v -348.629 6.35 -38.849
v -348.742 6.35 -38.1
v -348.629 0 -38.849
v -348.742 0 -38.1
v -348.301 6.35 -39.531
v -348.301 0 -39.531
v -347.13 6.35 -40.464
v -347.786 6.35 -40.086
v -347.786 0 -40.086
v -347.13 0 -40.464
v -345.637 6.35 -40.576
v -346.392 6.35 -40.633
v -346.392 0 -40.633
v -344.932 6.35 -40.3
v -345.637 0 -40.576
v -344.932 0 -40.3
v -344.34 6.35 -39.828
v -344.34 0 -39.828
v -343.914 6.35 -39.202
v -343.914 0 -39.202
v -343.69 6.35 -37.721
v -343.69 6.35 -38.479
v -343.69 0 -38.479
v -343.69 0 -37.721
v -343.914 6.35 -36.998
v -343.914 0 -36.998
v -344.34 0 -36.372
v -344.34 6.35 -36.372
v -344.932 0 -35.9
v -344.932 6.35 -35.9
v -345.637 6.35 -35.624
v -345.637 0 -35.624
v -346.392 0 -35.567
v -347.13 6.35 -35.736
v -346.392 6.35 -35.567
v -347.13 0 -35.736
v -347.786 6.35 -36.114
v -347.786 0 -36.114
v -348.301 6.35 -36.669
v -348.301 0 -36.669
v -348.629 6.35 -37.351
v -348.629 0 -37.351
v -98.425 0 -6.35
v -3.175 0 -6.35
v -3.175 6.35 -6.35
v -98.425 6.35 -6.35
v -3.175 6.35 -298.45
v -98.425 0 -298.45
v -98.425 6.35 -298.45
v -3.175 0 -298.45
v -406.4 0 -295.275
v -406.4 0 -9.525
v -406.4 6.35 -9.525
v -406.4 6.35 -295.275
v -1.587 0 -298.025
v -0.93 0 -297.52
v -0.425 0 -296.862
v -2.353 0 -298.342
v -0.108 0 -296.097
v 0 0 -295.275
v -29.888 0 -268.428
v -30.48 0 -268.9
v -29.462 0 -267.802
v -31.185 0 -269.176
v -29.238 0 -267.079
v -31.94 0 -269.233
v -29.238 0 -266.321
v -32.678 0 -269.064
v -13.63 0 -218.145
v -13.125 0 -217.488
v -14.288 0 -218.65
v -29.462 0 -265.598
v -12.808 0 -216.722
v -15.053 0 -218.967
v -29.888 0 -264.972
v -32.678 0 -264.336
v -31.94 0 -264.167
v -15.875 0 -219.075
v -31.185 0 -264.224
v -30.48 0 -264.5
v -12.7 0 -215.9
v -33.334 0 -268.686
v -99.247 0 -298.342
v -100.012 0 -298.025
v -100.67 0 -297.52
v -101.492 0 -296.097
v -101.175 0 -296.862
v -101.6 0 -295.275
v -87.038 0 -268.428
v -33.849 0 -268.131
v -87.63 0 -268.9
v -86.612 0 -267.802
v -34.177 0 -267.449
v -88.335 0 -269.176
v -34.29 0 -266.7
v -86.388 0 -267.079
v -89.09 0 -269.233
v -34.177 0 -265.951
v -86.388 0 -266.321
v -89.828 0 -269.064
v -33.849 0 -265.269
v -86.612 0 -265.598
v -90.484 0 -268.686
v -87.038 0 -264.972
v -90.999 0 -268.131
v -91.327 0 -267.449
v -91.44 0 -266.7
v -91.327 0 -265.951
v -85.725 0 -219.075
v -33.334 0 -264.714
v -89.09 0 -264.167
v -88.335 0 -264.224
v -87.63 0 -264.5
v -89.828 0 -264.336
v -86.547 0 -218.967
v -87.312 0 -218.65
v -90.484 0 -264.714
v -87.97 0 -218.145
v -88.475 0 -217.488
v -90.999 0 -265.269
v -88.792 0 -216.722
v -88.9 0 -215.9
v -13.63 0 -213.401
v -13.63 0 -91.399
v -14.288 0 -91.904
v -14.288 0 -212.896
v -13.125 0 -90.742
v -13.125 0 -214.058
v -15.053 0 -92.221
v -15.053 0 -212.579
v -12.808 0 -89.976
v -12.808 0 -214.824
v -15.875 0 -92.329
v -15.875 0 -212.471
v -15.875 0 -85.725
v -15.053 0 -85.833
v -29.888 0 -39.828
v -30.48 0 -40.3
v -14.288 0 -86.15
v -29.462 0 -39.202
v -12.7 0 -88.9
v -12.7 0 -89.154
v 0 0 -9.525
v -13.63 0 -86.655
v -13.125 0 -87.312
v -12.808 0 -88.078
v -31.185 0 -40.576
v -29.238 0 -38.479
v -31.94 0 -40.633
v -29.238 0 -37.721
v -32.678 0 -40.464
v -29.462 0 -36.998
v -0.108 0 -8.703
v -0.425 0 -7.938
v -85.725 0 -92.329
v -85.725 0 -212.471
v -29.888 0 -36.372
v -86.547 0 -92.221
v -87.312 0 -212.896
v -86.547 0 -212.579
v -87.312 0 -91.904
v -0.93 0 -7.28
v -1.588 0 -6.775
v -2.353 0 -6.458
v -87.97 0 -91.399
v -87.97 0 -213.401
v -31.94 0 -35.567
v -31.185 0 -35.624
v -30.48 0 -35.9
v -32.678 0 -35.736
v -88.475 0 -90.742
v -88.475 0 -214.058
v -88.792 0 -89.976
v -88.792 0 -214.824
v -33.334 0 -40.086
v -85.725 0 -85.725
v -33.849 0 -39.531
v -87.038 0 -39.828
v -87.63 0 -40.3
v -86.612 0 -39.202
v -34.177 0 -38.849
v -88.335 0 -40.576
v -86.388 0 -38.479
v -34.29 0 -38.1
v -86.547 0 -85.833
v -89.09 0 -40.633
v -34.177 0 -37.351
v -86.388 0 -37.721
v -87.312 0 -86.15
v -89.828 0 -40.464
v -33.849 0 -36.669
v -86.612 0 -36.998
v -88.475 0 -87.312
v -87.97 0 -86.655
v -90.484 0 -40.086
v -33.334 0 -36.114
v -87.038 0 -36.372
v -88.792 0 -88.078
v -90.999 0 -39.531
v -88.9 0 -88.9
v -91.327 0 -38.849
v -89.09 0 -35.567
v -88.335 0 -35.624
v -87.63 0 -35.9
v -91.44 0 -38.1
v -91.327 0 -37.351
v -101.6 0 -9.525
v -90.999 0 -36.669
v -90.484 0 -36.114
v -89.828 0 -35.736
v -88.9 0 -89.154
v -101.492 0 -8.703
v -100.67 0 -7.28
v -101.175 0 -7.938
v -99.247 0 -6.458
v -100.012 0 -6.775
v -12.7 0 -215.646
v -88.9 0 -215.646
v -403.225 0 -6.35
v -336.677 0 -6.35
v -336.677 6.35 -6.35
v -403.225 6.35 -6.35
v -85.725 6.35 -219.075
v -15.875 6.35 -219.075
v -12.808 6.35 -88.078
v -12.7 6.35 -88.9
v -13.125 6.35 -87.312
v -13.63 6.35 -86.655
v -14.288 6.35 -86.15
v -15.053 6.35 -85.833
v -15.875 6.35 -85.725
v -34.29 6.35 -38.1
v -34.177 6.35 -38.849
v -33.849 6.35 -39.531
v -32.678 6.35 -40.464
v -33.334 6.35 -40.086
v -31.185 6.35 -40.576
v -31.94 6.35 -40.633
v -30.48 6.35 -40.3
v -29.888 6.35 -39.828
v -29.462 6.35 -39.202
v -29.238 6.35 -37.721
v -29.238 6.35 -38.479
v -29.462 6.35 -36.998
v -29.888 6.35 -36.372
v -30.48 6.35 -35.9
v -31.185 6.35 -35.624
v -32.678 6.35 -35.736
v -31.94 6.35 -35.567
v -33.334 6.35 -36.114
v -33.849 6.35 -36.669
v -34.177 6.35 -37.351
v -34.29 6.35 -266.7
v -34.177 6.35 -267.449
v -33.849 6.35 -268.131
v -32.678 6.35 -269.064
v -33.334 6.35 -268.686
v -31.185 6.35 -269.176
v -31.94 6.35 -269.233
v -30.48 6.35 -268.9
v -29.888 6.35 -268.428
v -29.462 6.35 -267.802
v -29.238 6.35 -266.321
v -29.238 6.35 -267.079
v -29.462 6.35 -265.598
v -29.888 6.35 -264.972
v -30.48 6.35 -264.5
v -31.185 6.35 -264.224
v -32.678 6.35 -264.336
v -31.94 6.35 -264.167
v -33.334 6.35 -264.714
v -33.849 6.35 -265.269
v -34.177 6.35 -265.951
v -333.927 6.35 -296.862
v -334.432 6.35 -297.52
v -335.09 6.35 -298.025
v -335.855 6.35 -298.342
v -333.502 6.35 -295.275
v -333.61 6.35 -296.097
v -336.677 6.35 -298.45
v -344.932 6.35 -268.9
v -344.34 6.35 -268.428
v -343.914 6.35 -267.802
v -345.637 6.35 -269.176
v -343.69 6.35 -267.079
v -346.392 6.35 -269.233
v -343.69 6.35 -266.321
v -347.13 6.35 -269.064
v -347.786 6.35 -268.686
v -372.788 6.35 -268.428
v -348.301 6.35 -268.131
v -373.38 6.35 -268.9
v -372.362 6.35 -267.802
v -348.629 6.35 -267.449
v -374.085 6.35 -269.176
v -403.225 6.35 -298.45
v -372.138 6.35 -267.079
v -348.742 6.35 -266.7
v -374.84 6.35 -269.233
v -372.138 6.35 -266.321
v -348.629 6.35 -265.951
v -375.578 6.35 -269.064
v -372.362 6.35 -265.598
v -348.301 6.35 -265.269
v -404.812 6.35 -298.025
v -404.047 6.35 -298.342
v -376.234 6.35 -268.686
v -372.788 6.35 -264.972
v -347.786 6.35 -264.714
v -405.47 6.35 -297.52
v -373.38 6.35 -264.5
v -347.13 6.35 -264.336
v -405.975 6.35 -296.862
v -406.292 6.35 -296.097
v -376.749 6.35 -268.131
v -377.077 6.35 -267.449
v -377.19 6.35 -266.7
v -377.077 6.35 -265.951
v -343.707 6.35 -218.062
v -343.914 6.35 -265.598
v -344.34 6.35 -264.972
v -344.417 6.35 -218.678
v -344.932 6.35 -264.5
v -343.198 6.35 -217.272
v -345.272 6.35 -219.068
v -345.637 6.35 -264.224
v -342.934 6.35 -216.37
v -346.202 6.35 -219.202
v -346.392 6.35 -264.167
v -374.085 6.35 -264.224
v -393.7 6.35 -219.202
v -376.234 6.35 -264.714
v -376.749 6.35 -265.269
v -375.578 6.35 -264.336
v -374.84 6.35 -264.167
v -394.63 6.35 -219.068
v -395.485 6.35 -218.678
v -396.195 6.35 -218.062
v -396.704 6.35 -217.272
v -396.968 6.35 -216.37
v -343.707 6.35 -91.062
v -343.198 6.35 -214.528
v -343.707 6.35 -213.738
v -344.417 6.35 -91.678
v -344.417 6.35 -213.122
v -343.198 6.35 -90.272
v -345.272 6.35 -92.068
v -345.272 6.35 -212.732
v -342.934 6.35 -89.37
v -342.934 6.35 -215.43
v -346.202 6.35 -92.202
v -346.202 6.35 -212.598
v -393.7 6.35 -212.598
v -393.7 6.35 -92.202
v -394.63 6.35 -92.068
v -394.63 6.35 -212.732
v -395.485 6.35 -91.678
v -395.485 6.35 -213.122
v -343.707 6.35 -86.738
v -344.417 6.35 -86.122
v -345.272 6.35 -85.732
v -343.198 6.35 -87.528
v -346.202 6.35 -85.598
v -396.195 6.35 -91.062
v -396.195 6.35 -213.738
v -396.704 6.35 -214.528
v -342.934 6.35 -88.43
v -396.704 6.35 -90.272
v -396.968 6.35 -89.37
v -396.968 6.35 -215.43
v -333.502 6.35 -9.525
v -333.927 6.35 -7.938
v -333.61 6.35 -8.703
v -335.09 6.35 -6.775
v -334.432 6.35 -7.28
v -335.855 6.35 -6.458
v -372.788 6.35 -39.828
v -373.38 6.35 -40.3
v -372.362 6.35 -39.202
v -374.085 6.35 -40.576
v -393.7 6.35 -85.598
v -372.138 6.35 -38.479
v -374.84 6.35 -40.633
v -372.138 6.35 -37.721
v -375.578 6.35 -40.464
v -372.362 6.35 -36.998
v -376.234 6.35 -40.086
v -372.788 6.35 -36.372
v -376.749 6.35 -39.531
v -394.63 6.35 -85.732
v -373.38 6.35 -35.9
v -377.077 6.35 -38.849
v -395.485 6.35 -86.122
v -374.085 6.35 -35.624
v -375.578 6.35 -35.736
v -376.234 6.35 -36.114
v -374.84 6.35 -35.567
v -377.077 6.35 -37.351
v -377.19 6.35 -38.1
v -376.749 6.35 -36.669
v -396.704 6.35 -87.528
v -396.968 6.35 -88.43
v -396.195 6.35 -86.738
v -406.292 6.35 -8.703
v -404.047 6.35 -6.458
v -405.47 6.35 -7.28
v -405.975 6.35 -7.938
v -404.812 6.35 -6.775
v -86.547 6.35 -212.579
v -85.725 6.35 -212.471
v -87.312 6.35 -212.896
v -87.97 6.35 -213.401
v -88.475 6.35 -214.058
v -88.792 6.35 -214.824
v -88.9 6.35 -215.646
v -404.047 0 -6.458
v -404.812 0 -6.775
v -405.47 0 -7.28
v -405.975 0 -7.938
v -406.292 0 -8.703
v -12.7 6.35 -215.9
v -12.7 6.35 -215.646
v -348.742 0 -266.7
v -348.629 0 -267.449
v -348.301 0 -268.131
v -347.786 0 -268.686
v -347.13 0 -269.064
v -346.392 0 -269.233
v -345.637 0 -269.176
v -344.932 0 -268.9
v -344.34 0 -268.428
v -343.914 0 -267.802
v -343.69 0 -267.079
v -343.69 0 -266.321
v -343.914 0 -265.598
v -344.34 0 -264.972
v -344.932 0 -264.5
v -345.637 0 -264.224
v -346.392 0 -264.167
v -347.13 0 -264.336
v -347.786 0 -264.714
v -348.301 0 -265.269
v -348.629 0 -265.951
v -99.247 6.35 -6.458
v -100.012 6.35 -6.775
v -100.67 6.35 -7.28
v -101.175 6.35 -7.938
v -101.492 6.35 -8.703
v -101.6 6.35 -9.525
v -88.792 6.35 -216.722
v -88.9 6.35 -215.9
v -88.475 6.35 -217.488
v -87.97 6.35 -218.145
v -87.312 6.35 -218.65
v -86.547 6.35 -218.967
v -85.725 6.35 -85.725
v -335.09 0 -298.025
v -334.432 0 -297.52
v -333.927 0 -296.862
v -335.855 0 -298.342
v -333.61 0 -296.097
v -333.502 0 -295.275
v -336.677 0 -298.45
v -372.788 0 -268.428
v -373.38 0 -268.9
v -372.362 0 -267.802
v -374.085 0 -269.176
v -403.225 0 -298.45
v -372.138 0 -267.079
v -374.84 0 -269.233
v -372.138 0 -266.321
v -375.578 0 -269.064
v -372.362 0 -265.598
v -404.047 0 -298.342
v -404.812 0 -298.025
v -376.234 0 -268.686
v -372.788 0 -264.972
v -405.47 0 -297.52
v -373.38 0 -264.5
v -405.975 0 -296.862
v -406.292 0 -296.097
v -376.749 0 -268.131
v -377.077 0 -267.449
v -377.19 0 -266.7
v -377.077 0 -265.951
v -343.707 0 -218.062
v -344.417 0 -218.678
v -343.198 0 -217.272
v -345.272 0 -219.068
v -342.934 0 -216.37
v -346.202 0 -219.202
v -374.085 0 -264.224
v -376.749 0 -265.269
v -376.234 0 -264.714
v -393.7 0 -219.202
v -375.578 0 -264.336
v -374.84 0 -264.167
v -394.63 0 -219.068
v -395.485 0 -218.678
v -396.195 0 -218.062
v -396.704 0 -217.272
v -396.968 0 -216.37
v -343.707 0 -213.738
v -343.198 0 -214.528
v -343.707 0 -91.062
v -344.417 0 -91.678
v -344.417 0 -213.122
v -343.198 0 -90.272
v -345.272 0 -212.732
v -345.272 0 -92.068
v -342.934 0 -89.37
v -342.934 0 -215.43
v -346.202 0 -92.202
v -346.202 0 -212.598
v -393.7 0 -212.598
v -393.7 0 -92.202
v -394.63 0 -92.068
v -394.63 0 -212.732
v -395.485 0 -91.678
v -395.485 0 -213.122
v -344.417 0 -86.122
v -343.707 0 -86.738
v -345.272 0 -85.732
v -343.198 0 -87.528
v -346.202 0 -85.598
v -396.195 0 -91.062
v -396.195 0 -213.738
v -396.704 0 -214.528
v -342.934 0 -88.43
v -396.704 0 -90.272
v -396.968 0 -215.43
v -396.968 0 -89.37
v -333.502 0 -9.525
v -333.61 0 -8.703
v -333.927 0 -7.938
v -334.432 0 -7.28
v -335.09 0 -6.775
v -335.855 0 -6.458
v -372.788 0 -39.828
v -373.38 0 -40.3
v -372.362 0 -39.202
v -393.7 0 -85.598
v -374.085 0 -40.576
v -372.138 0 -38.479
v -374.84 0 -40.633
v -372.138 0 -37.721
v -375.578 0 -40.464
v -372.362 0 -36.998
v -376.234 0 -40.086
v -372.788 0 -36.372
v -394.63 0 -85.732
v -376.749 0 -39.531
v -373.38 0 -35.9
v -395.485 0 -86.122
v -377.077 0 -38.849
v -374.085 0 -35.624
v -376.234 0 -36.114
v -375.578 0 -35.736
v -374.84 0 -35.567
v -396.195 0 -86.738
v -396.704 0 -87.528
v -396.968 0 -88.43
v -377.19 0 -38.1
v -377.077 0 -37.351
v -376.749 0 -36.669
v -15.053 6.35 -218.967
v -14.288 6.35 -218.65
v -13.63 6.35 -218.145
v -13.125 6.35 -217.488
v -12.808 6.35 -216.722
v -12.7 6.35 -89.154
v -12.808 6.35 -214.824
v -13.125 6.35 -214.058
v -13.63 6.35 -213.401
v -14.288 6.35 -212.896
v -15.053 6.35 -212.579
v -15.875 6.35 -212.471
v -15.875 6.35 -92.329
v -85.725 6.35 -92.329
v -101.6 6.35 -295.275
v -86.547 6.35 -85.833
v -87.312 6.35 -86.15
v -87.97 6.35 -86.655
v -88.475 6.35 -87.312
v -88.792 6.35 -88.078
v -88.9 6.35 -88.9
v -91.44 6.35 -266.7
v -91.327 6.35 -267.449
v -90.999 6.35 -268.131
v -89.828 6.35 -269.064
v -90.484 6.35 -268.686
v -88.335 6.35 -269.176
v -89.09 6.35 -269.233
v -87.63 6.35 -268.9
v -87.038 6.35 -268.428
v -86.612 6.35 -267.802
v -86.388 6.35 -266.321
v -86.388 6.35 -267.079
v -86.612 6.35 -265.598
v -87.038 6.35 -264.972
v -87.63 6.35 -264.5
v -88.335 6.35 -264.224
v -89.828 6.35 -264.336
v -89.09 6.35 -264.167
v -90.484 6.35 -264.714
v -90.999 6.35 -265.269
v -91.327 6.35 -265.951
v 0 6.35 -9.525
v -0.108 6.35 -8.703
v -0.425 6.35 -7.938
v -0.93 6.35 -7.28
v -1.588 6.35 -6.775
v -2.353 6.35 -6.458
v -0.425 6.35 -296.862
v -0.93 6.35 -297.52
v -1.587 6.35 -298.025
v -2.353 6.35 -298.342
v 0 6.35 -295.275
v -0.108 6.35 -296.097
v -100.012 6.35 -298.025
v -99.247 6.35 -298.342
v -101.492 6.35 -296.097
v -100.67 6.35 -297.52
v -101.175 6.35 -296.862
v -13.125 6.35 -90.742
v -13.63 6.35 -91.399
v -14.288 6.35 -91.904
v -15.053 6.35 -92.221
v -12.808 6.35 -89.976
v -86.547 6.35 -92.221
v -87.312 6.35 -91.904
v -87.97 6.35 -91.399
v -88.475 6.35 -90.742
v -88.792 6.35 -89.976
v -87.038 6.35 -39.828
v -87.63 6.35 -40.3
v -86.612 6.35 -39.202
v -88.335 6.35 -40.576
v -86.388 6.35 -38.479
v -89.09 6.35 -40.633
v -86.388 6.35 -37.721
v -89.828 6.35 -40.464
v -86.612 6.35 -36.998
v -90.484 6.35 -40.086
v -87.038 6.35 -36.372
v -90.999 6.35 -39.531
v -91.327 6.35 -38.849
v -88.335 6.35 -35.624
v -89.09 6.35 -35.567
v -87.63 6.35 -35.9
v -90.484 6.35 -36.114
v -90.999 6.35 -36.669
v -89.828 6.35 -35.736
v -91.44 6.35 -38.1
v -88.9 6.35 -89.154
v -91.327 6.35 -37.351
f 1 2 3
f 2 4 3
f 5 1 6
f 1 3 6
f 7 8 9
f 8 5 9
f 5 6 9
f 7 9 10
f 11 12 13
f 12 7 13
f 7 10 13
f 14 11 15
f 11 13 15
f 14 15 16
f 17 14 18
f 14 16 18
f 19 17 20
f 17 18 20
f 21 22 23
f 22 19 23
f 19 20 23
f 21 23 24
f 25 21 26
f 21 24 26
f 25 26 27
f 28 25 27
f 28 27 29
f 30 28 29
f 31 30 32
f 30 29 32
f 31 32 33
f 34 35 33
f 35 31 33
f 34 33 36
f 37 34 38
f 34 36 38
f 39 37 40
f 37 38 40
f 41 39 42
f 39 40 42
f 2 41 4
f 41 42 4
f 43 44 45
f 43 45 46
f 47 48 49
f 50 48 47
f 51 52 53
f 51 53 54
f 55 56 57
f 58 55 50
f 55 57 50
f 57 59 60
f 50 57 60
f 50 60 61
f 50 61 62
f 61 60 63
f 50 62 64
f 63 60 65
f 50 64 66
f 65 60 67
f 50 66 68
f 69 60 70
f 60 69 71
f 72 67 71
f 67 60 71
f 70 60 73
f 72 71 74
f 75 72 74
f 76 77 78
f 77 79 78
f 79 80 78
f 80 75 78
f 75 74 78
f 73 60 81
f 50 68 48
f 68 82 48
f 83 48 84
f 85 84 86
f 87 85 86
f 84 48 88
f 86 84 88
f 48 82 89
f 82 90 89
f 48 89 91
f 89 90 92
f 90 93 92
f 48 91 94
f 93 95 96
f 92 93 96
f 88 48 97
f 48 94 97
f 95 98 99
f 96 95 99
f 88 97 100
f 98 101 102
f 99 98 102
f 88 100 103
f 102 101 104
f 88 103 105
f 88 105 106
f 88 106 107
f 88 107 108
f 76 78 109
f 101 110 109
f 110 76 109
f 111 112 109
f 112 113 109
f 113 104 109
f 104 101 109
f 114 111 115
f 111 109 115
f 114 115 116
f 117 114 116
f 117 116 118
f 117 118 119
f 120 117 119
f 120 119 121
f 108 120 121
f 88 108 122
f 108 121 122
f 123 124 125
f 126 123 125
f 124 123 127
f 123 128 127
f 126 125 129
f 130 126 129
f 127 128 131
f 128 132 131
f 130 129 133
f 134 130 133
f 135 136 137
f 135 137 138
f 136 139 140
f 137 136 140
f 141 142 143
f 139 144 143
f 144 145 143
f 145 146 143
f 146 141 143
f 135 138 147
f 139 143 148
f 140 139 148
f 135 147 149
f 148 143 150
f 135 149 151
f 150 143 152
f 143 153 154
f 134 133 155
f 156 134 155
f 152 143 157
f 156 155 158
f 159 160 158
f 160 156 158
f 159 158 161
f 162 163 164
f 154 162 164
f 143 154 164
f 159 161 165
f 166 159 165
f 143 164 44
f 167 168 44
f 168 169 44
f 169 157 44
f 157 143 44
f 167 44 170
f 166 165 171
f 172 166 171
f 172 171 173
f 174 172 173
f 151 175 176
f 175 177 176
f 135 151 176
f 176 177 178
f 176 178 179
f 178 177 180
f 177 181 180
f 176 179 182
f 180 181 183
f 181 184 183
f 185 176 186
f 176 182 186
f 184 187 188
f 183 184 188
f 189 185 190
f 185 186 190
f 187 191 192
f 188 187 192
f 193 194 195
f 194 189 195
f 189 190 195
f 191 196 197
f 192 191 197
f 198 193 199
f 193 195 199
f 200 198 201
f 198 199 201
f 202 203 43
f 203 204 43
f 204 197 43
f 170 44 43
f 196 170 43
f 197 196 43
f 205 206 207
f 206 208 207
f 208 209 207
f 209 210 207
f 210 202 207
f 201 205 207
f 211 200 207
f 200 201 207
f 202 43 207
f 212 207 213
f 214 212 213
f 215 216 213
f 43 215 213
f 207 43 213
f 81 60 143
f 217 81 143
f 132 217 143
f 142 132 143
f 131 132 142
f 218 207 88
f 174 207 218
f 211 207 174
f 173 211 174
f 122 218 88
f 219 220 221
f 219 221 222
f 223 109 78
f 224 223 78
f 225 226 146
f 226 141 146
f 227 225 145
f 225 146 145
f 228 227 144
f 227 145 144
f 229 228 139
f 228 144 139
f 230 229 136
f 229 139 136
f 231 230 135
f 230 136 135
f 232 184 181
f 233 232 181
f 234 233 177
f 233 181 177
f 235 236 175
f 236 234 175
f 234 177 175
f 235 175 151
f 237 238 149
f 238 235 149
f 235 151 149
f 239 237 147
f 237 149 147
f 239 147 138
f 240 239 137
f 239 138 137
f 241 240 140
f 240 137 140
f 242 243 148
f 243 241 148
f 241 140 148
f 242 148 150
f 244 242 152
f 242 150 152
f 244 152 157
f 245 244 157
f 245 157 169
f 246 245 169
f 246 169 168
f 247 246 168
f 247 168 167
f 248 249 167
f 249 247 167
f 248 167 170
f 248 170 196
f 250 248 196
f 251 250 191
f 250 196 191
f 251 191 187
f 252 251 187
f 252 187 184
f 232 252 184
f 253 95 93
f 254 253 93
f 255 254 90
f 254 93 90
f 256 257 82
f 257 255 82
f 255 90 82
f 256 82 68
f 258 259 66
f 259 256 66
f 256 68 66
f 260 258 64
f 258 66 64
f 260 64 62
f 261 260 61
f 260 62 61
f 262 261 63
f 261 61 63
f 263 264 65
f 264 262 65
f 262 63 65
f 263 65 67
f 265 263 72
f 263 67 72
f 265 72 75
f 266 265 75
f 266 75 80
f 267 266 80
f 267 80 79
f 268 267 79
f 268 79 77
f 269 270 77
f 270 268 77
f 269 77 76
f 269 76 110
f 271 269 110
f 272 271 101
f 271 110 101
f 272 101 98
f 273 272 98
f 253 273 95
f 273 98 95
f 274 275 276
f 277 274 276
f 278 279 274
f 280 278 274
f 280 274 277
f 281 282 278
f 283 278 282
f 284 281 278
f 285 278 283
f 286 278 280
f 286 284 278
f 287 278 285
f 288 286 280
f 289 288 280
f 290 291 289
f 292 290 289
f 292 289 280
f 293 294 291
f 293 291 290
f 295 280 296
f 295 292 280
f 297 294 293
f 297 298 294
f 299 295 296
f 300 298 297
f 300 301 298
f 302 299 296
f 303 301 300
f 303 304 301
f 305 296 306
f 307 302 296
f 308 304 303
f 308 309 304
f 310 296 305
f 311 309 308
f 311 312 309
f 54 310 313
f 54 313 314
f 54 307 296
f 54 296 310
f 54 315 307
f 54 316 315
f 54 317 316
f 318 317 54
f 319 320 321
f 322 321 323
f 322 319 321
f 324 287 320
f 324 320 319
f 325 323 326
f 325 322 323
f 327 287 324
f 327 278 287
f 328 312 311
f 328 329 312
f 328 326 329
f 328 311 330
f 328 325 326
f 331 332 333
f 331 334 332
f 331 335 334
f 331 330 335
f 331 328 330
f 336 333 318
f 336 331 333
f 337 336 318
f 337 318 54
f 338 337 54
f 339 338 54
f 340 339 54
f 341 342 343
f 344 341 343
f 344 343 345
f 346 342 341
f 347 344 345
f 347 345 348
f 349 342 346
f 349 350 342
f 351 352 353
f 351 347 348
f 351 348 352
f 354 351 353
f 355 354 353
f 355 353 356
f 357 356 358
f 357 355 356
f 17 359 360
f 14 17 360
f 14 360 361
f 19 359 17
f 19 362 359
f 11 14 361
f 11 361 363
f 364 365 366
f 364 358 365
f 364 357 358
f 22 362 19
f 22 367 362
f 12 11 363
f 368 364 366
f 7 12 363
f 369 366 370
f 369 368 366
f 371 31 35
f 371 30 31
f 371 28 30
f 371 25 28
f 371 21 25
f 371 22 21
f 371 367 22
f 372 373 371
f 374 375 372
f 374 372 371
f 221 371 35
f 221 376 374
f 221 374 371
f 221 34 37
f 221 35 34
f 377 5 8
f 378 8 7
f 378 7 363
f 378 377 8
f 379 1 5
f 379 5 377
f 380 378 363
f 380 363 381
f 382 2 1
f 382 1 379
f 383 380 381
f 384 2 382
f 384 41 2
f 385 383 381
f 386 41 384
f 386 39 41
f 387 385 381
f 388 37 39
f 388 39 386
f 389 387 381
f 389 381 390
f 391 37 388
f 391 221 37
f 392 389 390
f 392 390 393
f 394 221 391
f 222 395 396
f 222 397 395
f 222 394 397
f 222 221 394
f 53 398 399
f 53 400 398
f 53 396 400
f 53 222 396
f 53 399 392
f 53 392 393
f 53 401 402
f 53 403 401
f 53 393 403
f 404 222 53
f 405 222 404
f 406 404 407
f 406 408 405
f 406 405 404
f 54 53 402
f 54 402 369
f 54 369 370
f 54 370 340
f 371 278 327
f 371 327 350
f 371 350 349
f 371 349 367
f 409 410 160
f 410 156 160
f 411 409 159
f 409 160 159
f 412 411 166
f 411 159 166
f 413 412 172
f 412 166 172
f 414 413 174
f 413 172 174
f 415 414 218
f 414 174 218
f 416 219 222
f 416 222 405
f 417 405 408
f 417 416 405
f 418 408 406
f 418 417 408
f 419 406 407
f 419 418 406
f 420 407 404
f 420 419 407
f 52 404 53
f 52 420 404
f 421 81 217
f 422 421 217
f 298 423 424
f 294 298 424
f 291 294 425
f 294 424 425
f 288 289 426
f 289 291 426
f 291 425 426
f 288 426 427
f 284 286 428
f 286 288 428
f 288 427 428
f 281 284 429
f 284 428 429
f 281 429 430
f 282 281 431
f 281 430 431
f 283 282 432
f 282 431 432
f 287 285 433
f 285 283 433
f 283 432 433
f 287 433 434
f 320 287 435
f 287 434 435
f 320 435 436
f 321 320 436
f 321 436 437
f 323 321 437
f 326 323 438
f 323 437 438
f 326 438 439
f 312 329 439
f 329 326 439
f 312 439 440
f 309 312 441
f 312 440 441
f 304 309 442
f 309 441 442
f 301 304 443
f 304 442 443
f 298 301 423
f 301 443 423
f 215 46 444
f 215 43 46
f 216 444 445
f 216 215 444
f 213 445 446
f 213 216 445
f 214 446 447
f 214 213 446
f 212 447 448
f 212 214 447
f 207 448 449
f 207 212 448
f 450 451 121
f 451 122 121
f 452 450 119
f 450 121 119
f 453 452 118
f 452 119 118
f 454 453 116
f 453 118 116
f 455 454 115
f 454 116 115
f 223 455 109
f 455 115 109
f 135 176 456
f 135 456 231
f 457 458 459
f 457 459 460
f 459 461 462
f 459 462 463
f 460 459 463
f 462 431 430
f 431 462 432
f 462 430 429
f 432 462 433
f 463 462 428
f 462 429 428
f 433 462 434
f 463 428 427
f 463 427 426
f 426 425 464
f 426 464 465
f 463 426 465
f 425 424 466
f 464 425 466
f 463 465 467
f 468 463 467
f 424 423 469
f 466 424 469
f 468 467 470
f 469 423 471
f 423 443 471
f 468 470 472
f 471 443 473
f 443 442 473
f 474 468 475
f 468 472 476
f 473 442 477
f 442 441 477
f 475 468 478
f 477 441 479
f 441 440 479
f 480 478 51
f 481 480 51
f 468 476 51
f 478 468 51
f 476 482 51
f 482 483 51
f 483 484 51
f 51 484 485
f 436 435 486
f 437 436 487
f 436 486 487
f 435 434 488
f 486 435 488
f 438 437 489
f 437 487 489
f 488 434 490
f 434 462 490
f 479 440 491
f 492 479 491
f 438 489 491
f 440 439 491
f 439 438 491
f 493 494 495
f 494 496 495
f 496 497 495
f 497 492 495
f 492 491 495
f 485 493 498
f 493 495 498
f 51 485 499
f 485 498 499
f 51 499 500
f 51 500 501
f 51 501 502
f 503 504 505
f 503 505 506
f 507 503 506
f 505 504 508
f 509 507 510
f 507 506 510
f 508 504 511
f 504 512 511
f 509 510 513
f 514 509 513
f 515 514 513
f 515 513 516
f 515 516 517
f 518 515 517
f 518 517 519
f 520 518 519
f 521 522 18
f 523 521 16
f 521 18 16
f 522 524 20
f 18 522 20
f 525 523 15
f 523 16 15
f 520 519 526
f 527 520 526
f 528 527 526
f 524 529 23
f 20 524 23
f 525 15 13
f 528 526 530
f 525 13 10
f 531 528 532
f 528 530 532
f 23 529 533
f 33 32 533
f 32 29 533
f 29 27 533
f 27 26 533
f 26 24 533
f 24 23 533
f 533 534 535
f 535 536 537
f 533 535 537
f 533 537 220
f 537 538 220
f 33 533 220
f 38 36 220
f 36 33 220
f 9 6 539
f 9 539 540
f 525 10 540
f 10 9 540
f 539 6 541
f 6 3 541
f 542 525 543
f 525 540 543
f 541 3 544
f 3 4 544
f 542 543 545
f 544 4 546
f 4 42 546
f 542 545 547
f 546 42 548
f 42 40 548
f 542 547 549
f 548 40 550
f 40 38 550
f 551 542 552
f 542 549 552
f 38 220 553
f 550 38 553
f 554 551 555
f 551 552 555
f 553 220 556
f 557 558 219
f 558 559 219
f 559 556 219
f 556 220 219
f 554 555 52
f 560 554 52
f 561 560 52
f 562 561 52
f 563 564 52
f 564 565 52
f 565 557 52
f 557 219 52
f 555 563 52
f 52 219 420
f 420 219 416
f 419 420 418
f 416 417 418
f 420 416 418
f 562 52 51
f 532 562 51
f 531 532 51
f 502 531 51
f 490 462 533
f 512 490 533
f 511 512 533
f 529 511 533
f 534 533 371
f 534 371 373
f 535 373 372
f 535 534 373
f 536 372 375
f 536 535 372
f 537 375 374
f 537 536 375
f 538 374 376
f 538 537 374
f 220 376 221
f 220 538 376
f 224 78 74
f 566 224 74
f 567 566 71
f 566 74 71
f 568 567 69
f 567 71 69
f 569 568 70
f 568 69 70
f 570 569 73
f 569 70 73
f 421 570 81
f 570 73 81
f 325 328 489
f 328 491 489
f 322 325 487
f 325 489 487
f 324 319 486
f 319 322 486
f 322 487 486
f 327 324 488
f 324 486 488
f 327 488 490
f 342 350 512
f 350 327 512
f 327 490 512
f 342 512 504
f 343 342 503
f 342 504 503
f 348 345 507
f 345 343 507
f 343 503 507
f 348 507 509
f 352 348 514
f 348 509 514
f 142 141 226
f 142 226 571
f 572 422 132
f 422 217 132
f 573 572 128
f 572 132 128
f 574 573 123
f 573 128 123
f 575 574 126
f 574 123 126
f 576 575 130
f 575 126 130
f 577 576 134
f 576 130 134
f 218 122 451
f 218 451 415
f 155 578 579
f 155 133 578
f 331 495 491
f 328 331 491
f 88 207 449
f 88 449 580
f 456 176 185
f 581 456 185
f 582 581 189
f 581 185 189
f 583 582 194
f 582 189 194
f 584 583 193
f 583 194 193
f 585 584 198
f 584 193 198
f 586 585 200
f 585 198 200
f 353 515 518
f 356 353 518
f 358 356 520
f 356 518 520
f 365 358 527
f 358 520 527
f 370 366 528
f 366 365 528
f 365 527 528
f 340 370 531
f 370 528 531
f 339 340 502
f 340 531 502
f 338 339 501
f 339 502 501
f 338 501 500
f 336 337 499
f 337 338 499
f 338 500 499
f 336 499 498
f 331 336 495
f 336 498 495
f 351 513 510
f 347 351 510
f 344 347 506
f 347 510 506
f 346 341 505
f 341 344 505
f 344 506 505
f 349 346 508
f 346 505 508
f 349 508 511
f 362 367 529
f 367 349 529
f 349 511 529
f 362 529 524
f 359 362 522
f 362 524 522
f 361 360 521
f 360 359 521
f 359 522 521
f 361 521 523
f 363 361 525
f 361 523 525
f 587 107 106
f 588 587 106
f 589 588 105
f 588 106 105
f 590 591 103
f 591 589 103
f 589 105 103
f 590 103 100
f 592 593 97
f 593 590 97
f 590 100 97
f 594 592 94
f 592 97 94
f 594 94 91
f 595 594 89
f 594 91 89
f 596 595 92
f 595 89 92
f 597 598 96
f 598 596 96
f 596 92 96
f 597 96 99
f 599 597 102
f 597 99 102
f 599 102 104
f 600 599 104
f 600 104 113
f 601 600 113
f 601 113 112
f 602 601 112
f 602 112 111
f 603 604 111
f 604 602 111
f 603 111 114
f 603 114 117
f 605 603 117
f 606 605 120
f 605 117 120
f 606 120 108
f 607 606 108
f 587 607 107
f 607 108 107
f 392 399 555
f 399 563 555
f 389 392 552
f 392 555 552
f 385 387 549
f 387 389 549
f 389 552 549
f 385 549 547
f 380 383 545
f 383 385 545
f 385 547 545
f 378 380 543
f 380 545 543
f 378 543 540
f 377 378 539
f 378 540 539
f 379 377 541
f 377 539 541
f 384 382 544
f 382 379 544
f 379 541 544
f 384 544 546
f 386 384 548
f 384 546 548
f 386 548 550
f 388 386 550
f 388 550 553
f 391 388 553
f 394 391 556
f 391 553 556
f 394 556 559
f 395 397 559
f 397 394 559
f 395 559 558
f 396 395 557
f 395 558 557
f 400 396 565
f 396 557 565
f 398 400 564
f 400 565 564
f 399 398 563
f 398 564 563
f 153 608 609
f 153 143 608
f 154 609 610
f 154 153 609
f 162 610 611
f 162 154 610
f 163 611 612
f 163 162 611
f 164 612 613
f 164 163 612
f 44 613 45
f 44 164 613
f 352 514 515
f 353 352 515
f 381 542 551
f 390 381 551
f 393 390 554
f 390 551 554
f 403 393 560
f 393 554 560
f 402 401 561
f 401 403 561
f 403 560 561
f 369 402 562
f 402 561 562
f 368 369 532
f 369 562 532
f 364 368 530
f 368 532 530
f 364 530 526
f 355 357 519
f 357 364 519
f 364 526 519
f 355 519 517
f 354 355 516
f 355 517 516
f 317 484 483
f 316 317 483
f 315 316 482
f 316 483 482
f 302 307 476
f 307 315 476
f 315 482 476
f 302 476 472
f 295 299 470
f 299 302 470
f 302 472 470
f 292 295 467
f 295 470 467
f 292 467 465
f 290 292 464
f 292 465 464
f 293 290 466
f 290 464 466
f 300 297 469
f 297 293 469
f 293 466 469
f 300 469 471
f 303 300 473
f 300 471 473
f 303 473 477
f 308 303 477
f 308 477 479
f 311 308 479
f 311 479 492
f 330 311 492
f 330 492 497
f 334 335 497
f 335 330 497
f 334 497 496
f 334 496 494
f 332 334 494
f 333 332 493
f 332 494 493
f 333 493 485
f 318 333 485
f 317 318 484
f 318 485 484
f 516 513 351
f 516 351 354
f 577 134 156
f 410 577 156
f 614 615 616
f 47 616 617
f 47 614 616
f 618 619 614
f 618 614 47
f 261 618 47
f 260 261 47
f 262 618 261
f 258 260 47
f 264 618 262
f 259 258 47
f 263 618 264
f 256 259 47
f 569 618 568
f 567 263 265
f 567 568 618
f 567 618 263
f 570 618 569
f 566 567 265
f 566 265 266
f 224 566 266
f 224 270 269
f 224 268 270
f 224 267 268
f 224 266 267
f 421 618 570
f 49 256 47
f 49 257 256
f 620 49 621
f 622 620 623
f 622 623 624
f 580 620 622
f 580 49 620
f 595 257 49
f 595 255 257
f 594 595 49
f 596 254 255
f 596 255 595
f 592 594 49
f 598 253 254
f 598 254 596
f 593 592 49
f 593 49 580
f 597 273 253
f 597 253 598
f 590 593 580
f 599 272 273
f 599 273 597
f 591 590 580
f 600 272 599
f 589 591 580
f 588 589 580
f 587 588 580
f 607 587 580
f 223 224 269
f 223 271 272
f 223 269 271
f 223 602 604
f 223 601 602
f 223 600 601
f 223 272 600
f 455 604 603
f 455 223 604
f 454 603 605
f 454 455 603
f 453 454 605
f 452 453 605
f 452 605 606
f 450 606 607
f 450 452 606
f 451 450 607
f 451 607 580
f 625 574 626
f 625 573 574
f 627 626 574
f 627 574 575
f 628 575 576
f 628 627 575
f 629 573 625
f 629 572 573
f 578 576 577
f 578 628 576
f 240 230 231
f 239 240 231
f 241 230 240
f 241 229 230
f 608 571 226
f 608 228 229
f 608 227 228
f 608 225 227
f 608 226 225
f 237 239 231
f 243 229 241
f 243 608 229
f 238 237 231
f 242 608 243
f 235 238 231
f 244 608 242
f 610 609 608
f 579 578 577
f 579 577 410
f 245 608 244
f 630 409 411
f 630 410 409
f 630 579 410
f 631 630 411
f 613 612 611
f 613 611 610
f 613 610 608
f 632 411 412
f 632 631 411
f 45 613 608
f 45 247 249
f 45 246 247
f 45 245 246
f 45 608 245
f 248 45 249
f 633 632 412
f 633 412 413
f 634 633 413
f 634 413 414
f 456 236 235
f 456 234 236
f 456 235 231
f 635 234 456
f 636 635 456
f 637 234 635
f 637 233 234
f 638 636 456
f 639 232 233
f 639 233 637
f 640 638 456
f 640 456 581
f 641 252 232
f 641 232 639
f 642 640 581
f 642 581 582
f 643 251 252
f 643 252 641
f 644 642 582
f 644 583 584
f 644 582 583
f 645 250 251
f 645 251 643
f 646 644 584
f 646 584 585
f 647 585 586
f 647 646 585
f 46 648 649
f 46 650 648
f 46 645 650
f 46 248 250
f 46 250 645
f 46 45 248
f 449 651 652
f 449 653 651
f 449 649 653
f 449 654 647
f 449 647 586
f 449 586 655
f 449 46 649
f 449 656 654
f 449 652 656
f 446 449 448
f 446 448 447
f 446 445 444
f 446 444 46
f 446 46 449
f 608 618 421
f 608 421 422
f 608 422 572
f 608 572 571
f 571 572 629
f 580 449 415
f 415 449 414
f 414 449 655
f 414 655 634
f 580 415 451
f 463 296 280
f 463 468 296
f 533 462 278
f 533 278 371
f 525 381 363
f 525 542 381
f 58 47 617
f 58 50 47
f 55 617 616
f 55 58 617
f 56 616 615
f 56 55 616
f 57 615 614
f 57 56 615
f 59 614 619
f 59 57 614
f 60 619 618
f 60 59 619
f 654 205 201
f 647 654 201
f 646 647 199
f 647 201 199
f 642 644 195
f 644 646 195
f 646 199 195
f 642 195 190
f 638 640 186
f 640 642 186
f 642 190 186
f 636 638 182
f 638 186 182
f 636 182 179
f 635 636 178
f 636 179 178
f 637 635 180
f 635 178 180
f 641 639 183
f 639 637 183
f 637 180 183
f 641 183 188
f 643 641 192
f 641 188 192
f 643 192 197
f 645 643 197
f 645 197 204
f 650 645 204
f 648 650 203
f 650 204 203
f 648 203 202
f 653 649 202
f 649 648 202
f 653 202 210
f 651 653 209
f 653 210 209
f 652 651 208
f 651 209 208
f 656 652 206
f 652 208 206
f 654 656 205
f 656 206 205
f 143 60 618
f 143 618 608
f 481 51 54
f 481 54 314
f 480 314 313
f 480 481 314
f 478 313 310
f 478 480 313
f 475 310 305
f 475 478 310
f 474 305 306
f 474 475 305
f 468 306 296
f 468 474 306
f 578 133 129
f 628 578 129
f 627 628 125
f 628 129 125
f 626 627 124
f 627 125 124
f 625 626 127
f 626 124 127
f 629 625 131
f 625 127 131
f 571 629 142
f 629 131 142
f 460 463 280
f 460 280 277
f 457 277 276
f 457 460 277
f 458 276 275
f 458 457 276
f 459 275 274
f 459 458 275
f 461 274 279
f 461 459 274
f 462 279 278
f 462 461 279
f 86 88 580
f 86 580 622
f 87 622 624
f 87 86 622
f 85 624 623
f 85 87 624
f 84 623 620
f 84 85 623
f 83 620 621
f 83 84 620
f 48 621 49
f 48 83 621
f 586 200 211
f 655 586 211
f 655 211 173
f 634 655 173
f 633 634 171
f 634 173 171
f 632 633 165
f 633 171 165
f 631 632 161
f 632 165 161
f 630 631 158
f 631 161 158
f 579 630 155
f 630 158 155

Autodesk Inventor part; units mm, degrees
ref_plane "YZ Plane" through (0, 0, 0) normal (1, 0, 0) x (0, 1, 0)
ref_plane "XZ Plane" through (0, 0, 0) normal (0, 1, 0) x (-1, 0, 0)
ref_plane "XY Plane" through (0, 0, 0) normal (0, 0, 1) x (1, 0, 0)
sketch "Sketch1" plane through (0, 0, 0) normal (0, 1, 0) x (-1, 0, 0)
  line L0 (0, 0) -> (304.8, 0) construction
  line L1 (304.8, 0) -> (304.8, -304.8) construction
  line L2 (304.8, -304.8) -> (0, -304.8) construction
  line L3 (0, -152.4) -> (304.8, -152.4) construction
  line L4 (31.75, -38.1) -> (88.9, -38.1) construction
  line L5 (88.9, -38.1) -> (346.202, -38.1) construction
  line L6 (346.202, -38.1) -> (374.65, -38.1) construction
  line L7 (374.65, -38.1) -> (406.4, -38.1) construction
  circle A0 centre (31.75, -38.1) radius 2.54
  circle A1 centre (88.9, -38.1) radius 2.54
  circle A2 centre (346.202, -38.1) radius 2.54
  circle A3 centre (374.65, -38.1) radius 2.54
  line L8 (101.6, -9.525) -> (101.6, -152.4)
  circle A4 centre (31.75, -266.7) radius 2.54
  circle A5 centre (88.9, -266.7) radius 2.54
  line L9 (101.6, -295.275) -> (101.6, -152.4)
  line L10 (88.9, -88.9) -> (88.9, -88.9)
  line L11 (85.725, -85.725) -> (15.875, -85.725)
  line L12 (12.7, -88.9) -> (12.7, -89.154)
  line L13 (15.875, -92.329) -> (85.725, -92.329)
  arc A6 (88.9, -88.9) -> (85.725, -85.725) centre (85.725, -88.9) ccw
  arc A7 (85.725, -92.329) -> (88.9, -89.154) centre (85.725, -89.154) ccw
  arc A8 (15.875, -85.725) -> (12.7, -88.9) centre (15.875, -88.9) ccw
  arc A9 (12.7, -89.154) -> (15.875, -92.329) centre (15.875, -89.154) ccw
  line L14 (88.9, -88.9) -> (88.9, -89.154)
  line L15 (88.9, -215.9) -> (88.9, -215.9)
  line L16 (85.725, -219.075) -> (15.875, -219.075)
  line L17 (12.7, -215.9) -> (12.7, -215.646)
  line L18 (15.875, -212.471) -> (85.725, -212.471)
  arc A10 (85.725, -219.075) -> (88.9, -215.9) centre (85.725, -215.9) ccw
  arc A11 (88.9, -215.646) -> (85.725, -212.471) centre (85.725, -215.646) ccw
  arc A12 (12.7, -215.9) -> (15.875, -219.075) centre (15.875, -215.9) ccw
  arc A13 (15.875, -212.471) -> (12.7, -215.646) centre (15.875, -215.646) ccw
  line L19 (88.9, -215.9) -> (88.9, -215.646)
  arc A14 (98.425, -298.45) -> (101.6, -295.275) centre (98.425, -295.275) ccw
  arc A15 (101.6, -9.525) -> (98.425, -6.35) centre (98.425, -9.525) ccw
  line L20 (346.202, -38.1) -> (333.502, -38.1) construction
  line L21 (333.502, -38.1) -> (333.502, -9.525)
  line L22 (406.4, -69.85) -> (406.4, -152.4)
  line L23 (333.502, -38.1) -> (333.502, -152.4)
  circle A16 centre (393.7, -88.9) radius 3.302
  line L24 (393.7, -85.598) -> (346.202, -85.598)
  line L25 (346.202, -85.598) -> (346.202, -92.202)
  line L26 (346.202, -92.202) -> (393.7, -92.202)
  line L27 (393.7, -92.202) -> (393.7, -85.598)
  circle A17 centre (346.202, -88.9) radius 3.302
  line L28 (88.9, -266.7) -> (346.202, -266.7) construction
  line L29 (346.202, -266.7) -> (374.65, -266.7) construction
  line L30 (374.65, -266.7) -> (406.4, -266.7) construction
  circle A18 centre (346.202, -266.7) radius 2.54
  circle A19 centre (374.65, -266.7) radius 2.54
  line L31 (346.202, -266.7) -> (333.502, -266.7) construction
  line L32 (333.502, -266.7) -> (333.502, -295.275)
  line L33 (406.4, -234.95) -> (406.4, -152.4)
  line L34 (333.502, -266.7) -> (333.502, -152.4)
  circle A20 centre (393.7, -215.9) radius 3.302
  line L35 (393.7, -219.202) -> (346.202, -219.202)
  line L36 (346.202, -219.202) -> (346.202, -212.598)
  line L37 (346.202, -212.598) -> (393.7, -212.598)
  line L38 (393.7, -212.598) -> (393.7, -219.202)
  circle A21 centre (346.202, -215.9) radius 3.302
  line L39 (98.425, -298.45) -> (3.175, -298.45)
  line L40 (0, -295.275) -> (0, -9.525)
  line L41 (3.175, -6.35) -> (98.425, -6.35)
  line L42 (406.4, -234.95) -> (406.4, -295.275)
  line L43 (403.225, -298.45) -> (336.677, -298.45)
  line L44 (336.677, -6.35) -> (403.225, -6.35)
  line L45 (406.4, -9.525) -> (406.4, -69.85)
  arc A22 (3.175, -6.35) -> (0, -9.525) centre (3.175, -9.525) ccw
  arc A23 (0, -295.275) -> (3.175, -298.45) centre (3.175, -295.275) ccw
  arc A24 (403.225, -298.45) -> (406.4, -295.275) centre (403.225, -295.275) ccw
  arc A25 (333.502, -295.275) -> (336.677, -298.45) centre (336.677, -295.275) ccw
  arc A26 (406.4, -9.525) -> (403.225, -6.35) centre (403.225, -9.525) ccw
  arc A27 (336.677, -6.35) -> (333.502, -9.525) centre (336.677, -9.525) ccw
  line L46 (98.425, -298.45) -> (3.175, -298.45)
  line L47 (0, -295.275) -> (0, -9.525)
  line L48 (3.175, -6.35) -> (98.425, -6.35)
  line L49 (101.6, -9.525) -> (101.6, -295.275)
  arc A28 (98.425, -298.45) -> (101.6, -295.275) centre (98.425, -295.275) ccw
  arc A29 (0, -295.275) -> (3.175, -298.45) centre (3.175, -295.275) ccw
  arc A30 (3.175, -6.35) -> (0, -9.525) centre (3.175, -9.525) ccw
  arc A31 (101.6, -9.525) -> (98.425, -6.35) centre (98.425, -9.525) ccw
  point P0 (101.6, -6.35)
  point P1 (101.6, -298.45)
  point P2 (12.7, -92.329)
  point P3 (12.7, -85.725)
  point P4 (12.7, -212.471)
  point P5 (12.7, -219.075)
  point P6 (333.502, -6.35)
  point P7 (333.502, -298.45)
  point P8 (406.4, -6.35)
  dimension "d53" = 6.604
  dimension "d0" = 304.8
  dimension "d1" = 304.8
  dimension "d6" = 57.15
  dimension "d7" = 257.302
  dimension "d8" = 28.448
  dimension "d9" = 31.75
  dimension "d10" = 5.08
  dimension "d11" = 5.08
  dimension "d12" = 5.08
  dimension "d13" = 5.08
  dimension "d41" = 6.604
  dimension "d42" = 3.175
  dimension "d44" = 12.7
  dimension "d45" = 31.75
  dimension "d58" = 3.175
  dimension "d59" = 3.175
extrude "Extrusion2" add sketch "Sketch1" along normal blind 6.35
properties part number "vrRig_v08_slideMountBottom"
